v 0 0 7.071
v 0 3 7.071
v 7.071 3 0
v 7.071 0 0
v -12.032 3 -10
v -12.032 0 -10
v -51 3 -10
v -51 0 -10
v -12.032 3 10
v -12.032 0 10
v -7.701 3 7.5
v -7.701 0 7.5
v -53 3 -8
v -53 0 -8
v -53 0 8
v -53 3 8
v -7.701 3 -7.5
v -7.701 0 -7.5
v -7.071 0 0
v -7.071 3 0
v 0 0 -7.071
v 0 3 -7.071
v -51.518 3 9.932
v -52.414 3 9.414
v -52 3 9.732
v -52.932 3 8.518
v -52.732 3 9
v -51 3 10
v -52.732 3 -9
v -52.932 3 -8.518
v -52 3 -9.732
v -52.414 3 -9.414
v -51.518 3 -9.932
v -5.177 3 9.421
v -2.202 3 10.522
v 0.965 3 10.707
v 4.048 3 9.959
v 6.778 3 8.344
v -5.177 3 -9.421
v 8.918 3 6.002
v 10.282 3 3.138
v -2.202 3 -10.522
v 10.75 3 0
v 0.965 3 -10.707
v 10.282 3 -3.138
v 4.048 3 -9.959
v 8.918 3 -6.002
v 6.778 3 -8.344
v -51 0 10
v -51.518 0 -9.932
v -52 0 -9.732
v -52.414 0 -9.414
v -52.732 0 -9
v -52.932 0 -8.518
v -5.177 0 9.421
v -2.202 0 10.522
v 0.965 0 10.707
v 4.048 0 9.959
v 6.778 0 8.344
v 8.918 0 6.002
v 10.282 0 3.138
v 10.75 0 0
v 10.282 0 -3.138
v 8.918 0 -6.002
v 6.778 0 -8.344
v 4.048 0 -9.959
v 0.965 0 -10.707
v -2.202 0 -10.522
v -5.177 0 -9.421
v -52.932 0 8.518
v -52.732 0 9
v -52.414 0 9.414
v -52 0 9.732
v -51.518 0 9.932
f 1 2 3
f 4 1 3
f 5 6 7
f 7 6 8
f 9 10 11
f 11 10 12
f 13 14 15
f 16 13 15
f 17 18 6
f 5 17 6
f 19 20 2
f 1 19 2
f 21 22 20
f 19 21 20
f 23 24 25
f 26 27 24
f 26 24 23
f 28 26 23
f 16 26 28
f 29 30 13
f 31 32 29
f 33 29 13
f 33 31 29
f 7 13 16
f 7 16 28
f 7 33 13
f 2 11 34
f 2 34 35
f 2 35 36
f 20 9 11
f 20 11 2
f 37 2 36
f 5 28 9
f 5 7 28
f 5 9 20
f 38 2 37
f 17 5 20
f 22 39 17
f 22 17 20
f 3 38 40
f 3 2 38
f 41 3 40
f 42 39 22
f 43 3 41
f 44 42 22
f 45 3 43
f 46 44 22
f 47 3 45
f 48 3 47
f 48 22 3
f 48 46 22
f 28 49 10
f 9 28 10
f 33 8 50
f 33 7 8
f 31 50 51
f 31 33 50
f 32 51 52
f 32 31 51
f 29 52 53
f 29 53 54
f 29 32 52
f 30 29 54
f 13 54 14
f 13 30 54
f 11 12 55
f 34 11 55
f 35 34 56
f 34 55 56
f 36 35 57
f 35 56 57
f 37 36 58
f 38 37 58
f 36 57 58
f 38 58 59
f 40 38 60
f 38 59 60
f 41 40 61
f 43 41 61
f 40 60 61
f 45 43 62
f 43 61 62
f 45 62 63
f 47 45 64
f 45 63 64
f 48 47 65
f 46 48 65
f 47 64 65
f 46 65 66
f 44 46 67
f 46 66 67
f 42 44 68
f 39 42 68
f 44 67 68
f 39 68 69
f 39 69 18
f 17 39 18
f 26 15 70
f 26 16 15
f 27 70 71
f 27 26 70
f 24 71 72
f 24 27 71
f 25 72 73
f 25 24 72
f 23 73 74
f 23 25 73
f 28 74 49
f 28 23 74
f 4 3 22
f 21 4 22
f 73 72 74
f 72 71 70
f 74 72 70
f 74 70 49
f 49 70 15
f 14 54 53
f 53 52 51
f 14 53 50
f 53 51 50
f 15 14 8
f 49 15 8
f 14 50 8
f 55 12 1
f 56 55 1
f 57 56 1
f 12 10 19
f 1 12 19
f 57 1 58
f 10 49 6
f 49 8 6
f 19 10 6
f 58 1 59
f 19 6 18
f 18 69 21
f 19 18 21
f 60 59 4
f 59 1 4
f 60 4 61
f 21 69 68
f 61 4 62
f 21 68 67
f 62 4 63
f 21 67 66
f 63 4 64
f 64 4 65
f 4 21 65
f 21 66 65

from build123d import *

# Parameters (mm, degrees)
EXTRUDE_1_DEPTH     = 3
FILLET_1_R          = 2
CUT_EXTRUDE_1_DEPTH = 55.162371625


with BuildPart() as part:
    # 草图2 → 凸台-拉伸1 (new body)
    with BuildSketch(Plane(origin=(0, 0, 0), x_dir=(1, 0, 0), z_dir=(0, 1, 0))):
        with BuildLine():
            Line((-12.031587919, -10), (-7.7014609, -7.5))
            ThreePointArc((-7.7014609, -7.5), (10.75, 0), (-7.7014609, 7.5))
            Line((-7.7014609, 7.5), (-12.031587919, 10))
            Line((-12.031587919, 10), (-53, 10))
            Line((-53, 10), (-53, -10))
            Line((-53, -10), (-12.031587919, -10))
        make_face()
    extrude(amount=EXTRUDE_1_DEPTH)

    # 圆角1
    fillet_1_edges = [part.edges().sort_by_distance(p)[0] for p in [
        (-53, 1.5, -10),
        (-53, 1.5, 10),
    ]]
    fillet(fillet_1_edges, radius=FILLET_1_R)

    # 草图3 → 切除-拉伸1 (cut, through all)
    with BuildSketch(Plane(origin=(0, 3, 0), x_dir=(1, 0, 0), z_dir=(0, 1, 0))):
        Polygon((0, 7.071067812), (-7.071067812, 0), (0, -7.071067812), (7.071067812, 0), align=None)
    extrude(amount=-CUT_EXTRUDE_1_DEPTH, mode=Mode.SUBTRACT)


solid = part.part
